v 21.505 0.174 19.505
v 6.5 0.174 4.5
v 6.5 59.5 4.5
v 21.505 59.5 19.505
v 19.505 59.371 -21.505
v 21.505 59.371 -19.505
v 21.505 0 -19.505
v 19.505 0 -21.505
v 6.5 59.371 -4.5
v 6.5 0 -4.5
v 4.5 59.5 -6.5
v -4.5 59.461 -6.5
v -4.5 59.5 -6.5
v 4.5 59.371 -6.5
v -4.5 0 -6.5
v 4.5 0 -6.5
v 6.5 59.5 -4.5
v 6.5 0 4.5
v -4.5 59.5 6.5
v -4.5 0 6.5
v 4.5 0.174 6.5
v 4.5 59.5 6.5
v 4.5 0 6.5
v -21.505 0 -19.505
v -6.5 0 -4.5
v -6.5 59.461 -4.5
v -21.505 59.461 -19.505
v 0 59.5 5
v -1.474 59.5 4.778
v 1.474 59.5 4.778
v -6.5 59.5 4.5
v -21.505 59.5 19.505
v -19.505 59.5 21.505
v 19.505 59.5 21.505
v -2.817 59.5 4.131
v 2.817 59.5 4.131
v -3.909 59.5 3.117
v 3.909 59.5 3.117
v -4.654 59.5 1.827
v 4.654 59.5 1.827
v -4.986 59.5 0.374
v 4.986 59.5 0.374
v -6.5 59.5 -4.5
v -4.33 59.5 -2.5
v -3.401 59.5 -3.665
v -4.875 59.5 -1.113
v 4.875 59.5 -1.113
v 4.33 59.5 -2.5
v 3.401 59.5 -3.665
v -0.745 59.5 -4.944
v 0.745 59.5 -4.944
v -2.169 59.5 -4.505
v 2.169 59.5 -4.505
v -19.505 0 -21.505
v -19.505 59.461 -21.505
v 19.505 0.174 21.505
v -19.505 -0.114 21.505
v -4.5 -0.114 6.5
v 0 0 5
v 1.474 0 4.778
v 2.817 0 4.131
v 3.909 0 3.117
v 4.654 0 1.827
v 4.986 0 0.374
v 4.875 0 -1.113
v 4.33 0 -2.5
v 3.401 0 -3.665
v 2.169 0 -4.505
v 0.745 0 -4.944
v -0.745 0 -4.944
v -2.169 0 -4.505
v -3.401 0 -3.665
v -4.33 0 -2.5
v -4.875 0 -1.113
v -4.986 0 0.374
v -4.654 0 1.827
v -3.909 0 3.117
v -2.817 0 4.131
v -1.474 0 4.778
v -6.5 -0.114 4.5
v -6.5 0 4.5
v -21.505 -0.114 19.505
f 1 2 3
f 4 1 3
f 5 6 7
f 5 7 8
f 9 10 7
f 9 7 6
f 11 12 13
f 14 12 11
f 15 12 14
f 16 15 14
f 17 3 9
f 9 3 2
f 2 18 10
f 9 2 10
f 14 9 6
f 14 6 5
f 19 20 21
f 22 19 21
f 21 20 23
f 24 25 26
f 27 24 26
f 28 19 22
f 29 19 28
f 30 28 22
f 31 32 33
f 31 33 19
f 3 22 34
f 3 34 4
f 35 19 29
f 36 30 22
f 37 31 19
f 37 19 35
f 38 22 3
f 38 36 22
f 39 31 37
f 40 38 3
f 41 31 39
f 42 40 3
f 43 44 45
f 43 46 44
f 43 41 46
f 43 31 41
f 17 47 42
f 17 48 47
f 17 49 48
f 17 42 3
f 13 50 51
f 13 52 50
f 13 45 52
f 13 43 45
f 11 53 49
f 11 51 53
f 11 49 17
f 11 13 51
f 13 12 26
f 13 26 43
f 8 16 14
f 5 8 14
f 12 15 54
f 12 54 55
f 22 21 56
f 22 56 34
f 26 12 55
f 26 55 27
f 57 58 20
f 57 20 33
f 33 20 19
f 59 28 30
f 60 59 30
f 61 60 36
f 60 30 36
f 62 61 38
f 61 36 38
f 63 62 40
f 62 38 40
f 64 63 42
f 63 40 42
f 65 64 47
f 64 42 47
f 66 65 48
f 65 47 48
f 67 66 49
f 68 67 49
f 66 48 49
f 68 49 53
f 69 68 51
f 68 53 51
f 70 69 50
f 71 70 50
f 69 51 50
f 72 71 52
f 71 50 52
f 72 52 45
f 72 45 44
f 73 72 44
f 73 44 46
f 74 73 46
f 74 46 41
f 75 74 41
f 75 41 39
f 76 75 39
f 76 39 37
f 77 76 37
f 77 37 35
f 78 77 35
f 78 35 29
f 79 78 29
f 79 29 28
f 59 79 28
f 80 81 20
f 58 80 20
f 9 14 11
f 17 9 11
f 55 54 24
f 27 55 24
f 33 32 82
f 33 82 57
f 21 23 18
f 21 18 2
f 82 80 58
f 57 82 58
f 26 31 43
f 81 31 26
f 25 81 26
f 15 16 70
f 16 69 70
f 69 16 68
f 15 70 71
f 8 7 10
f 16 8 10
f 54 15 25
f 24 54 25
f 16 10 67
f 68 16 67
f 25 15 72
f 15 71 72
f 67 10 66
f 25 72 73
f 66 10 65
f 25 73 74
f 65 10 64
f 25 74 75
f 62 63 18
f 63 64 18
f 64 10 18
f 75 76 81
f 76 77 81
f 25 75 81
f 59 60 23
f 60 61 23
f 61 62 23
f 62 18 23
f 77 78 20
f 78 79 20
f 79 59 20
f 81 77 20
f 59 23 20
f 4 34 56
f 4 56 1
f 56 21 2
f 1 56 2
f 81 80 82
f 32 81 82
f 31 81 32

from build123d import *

# Parameters (mm, degrees)
SKETCH1_W           = 13
SKETCH1_H           = 13
BOSS_EXTRUDE1_DEPTH = 59.5
CHAMFER1_SIZE       = 2
SKETCH6_W           = 2.828427124
SKETCH6_H           = 59.370634799
BOSS_EXTRUDE3_DEPTH = 21.22
SKETCH5_W           = 2.828427124
SKETCH5_H           = 59.460523053
BOSS_EXTRUDE2_DEPTH = 21.22
SKETCH7_W           = 2.828427124
SKETCH7_H           = 59.614279407
BOSS_EXTRUDE4_DEPTH = 21.22
SKETCH8_W           = 2.828427124
SKETCH8_H           = 59.32576951
BOSS_EXTRUDE5_DEPTH = 21.22
SKETCH10_R          = 5
CUT_EXTRUDE2_DEPTH  = 67.923655478


with BuildPart() as part:
    # Sketch1 → Boss-Extrude1 (new body)
    with BuildSketch(Plane(origin=(0, 0, 0), x_dir=(1, 0, 0), z_dir=(0, 1, 0))):
        Rectangle(SKETCH1_W, SKETCH1_H)
    extrude(amount=BOSS_EXTRUDE1_DEPTH)

    # Chamfer1
    chamfer1_edges = [part.edges().sort_by_distance(p)[0] for p in [
        (6.5, 29.75, 6.5),
        (-6.5, 29.75, 6.5),
        (-6.5, 29.75, -6.5),
        (6.5, 29.75, -6.5),
    ]]
    chamfer(chamfer1_edges, length=CHAMFER1_SIZE)

    # Sketch6 → Boss-Extrude3 (add)
    with BuildSketch(Plane(origin=(5.5, 0, -5.5), x_dir=(-0.7071067811865465, 0, -0.7071067811865487), z_dir=(0.7071067811865487, 0, -0.7071067811865465))):
        with Locations((0, 29.6853174)):
            Rectangle(SKETCH6_W, SKETCH6_H)
    extrude(amount=BOSS_EXTRUDE3_DEPTH)

    # Sketch5 → Boss-Extrude2 (add)
    with BuildSketch(Plane(origin=(-5.5, 0, -5.5), x_dir=(-0.7071067811865487, 0, 0.7071067811865465), z_dir=(-0.7071067811865465, 0, -0.7071067811865487))):
        with Locations((0, 29.730261527)):
            Rectangle(SKETCH5_W, SKETCH5_H)
    extrude(amount=BOSS_EXTRUDE2_DEPTH)

    # Sketch7 → Boss-Extrude4 (add)
    with BuildSketch(Plane(origin=(-5.5, 0, 5.5), x_dir=(0.7071067811865465, 0, 0.7071067811865487), z_dir=(-0.7071067811865487, 0, 0.7071067811865465))):
        with Locations((0, 29.692860297)):
            Rectangle(SKETCH7_W, SKETCH7_H)
    extrude(amount=BOSS_EXTRUDE4_DEPTH)

    # Sketch8 → Boss-Extrude5 (add)
    with BuildSketch(Plane(origin=(5.5, 0, 5.5), x_dir=(0.7071067811865487, 0, -0.7071067811865465), z_dir=(0.7071067811865465, 0, 0.7071067811865487))):
        with Locations((0, 29.837115245)):
            Rectangle(SKETCH8_W, SKETCH8_H)
    extrude(amount=BOSS_EXTRUDE5_DEPTH)

    # Sketch10 → Cut-Extrude2 (cut, through all)
    with BuildSketch(Plane(origin=(0, 59.5, 0), x_dir=(1, 0, 0), z_dir=(0, 1, 0))):
        with Locations(Location((0, 0, 0), (0, 0, 270))):
            Circle(SKETCH10_R)
    extrude(amount=-CUT_EXTRUDE2_DEPTH, mode=Mode.SUBTRACT)


solid = part.part
